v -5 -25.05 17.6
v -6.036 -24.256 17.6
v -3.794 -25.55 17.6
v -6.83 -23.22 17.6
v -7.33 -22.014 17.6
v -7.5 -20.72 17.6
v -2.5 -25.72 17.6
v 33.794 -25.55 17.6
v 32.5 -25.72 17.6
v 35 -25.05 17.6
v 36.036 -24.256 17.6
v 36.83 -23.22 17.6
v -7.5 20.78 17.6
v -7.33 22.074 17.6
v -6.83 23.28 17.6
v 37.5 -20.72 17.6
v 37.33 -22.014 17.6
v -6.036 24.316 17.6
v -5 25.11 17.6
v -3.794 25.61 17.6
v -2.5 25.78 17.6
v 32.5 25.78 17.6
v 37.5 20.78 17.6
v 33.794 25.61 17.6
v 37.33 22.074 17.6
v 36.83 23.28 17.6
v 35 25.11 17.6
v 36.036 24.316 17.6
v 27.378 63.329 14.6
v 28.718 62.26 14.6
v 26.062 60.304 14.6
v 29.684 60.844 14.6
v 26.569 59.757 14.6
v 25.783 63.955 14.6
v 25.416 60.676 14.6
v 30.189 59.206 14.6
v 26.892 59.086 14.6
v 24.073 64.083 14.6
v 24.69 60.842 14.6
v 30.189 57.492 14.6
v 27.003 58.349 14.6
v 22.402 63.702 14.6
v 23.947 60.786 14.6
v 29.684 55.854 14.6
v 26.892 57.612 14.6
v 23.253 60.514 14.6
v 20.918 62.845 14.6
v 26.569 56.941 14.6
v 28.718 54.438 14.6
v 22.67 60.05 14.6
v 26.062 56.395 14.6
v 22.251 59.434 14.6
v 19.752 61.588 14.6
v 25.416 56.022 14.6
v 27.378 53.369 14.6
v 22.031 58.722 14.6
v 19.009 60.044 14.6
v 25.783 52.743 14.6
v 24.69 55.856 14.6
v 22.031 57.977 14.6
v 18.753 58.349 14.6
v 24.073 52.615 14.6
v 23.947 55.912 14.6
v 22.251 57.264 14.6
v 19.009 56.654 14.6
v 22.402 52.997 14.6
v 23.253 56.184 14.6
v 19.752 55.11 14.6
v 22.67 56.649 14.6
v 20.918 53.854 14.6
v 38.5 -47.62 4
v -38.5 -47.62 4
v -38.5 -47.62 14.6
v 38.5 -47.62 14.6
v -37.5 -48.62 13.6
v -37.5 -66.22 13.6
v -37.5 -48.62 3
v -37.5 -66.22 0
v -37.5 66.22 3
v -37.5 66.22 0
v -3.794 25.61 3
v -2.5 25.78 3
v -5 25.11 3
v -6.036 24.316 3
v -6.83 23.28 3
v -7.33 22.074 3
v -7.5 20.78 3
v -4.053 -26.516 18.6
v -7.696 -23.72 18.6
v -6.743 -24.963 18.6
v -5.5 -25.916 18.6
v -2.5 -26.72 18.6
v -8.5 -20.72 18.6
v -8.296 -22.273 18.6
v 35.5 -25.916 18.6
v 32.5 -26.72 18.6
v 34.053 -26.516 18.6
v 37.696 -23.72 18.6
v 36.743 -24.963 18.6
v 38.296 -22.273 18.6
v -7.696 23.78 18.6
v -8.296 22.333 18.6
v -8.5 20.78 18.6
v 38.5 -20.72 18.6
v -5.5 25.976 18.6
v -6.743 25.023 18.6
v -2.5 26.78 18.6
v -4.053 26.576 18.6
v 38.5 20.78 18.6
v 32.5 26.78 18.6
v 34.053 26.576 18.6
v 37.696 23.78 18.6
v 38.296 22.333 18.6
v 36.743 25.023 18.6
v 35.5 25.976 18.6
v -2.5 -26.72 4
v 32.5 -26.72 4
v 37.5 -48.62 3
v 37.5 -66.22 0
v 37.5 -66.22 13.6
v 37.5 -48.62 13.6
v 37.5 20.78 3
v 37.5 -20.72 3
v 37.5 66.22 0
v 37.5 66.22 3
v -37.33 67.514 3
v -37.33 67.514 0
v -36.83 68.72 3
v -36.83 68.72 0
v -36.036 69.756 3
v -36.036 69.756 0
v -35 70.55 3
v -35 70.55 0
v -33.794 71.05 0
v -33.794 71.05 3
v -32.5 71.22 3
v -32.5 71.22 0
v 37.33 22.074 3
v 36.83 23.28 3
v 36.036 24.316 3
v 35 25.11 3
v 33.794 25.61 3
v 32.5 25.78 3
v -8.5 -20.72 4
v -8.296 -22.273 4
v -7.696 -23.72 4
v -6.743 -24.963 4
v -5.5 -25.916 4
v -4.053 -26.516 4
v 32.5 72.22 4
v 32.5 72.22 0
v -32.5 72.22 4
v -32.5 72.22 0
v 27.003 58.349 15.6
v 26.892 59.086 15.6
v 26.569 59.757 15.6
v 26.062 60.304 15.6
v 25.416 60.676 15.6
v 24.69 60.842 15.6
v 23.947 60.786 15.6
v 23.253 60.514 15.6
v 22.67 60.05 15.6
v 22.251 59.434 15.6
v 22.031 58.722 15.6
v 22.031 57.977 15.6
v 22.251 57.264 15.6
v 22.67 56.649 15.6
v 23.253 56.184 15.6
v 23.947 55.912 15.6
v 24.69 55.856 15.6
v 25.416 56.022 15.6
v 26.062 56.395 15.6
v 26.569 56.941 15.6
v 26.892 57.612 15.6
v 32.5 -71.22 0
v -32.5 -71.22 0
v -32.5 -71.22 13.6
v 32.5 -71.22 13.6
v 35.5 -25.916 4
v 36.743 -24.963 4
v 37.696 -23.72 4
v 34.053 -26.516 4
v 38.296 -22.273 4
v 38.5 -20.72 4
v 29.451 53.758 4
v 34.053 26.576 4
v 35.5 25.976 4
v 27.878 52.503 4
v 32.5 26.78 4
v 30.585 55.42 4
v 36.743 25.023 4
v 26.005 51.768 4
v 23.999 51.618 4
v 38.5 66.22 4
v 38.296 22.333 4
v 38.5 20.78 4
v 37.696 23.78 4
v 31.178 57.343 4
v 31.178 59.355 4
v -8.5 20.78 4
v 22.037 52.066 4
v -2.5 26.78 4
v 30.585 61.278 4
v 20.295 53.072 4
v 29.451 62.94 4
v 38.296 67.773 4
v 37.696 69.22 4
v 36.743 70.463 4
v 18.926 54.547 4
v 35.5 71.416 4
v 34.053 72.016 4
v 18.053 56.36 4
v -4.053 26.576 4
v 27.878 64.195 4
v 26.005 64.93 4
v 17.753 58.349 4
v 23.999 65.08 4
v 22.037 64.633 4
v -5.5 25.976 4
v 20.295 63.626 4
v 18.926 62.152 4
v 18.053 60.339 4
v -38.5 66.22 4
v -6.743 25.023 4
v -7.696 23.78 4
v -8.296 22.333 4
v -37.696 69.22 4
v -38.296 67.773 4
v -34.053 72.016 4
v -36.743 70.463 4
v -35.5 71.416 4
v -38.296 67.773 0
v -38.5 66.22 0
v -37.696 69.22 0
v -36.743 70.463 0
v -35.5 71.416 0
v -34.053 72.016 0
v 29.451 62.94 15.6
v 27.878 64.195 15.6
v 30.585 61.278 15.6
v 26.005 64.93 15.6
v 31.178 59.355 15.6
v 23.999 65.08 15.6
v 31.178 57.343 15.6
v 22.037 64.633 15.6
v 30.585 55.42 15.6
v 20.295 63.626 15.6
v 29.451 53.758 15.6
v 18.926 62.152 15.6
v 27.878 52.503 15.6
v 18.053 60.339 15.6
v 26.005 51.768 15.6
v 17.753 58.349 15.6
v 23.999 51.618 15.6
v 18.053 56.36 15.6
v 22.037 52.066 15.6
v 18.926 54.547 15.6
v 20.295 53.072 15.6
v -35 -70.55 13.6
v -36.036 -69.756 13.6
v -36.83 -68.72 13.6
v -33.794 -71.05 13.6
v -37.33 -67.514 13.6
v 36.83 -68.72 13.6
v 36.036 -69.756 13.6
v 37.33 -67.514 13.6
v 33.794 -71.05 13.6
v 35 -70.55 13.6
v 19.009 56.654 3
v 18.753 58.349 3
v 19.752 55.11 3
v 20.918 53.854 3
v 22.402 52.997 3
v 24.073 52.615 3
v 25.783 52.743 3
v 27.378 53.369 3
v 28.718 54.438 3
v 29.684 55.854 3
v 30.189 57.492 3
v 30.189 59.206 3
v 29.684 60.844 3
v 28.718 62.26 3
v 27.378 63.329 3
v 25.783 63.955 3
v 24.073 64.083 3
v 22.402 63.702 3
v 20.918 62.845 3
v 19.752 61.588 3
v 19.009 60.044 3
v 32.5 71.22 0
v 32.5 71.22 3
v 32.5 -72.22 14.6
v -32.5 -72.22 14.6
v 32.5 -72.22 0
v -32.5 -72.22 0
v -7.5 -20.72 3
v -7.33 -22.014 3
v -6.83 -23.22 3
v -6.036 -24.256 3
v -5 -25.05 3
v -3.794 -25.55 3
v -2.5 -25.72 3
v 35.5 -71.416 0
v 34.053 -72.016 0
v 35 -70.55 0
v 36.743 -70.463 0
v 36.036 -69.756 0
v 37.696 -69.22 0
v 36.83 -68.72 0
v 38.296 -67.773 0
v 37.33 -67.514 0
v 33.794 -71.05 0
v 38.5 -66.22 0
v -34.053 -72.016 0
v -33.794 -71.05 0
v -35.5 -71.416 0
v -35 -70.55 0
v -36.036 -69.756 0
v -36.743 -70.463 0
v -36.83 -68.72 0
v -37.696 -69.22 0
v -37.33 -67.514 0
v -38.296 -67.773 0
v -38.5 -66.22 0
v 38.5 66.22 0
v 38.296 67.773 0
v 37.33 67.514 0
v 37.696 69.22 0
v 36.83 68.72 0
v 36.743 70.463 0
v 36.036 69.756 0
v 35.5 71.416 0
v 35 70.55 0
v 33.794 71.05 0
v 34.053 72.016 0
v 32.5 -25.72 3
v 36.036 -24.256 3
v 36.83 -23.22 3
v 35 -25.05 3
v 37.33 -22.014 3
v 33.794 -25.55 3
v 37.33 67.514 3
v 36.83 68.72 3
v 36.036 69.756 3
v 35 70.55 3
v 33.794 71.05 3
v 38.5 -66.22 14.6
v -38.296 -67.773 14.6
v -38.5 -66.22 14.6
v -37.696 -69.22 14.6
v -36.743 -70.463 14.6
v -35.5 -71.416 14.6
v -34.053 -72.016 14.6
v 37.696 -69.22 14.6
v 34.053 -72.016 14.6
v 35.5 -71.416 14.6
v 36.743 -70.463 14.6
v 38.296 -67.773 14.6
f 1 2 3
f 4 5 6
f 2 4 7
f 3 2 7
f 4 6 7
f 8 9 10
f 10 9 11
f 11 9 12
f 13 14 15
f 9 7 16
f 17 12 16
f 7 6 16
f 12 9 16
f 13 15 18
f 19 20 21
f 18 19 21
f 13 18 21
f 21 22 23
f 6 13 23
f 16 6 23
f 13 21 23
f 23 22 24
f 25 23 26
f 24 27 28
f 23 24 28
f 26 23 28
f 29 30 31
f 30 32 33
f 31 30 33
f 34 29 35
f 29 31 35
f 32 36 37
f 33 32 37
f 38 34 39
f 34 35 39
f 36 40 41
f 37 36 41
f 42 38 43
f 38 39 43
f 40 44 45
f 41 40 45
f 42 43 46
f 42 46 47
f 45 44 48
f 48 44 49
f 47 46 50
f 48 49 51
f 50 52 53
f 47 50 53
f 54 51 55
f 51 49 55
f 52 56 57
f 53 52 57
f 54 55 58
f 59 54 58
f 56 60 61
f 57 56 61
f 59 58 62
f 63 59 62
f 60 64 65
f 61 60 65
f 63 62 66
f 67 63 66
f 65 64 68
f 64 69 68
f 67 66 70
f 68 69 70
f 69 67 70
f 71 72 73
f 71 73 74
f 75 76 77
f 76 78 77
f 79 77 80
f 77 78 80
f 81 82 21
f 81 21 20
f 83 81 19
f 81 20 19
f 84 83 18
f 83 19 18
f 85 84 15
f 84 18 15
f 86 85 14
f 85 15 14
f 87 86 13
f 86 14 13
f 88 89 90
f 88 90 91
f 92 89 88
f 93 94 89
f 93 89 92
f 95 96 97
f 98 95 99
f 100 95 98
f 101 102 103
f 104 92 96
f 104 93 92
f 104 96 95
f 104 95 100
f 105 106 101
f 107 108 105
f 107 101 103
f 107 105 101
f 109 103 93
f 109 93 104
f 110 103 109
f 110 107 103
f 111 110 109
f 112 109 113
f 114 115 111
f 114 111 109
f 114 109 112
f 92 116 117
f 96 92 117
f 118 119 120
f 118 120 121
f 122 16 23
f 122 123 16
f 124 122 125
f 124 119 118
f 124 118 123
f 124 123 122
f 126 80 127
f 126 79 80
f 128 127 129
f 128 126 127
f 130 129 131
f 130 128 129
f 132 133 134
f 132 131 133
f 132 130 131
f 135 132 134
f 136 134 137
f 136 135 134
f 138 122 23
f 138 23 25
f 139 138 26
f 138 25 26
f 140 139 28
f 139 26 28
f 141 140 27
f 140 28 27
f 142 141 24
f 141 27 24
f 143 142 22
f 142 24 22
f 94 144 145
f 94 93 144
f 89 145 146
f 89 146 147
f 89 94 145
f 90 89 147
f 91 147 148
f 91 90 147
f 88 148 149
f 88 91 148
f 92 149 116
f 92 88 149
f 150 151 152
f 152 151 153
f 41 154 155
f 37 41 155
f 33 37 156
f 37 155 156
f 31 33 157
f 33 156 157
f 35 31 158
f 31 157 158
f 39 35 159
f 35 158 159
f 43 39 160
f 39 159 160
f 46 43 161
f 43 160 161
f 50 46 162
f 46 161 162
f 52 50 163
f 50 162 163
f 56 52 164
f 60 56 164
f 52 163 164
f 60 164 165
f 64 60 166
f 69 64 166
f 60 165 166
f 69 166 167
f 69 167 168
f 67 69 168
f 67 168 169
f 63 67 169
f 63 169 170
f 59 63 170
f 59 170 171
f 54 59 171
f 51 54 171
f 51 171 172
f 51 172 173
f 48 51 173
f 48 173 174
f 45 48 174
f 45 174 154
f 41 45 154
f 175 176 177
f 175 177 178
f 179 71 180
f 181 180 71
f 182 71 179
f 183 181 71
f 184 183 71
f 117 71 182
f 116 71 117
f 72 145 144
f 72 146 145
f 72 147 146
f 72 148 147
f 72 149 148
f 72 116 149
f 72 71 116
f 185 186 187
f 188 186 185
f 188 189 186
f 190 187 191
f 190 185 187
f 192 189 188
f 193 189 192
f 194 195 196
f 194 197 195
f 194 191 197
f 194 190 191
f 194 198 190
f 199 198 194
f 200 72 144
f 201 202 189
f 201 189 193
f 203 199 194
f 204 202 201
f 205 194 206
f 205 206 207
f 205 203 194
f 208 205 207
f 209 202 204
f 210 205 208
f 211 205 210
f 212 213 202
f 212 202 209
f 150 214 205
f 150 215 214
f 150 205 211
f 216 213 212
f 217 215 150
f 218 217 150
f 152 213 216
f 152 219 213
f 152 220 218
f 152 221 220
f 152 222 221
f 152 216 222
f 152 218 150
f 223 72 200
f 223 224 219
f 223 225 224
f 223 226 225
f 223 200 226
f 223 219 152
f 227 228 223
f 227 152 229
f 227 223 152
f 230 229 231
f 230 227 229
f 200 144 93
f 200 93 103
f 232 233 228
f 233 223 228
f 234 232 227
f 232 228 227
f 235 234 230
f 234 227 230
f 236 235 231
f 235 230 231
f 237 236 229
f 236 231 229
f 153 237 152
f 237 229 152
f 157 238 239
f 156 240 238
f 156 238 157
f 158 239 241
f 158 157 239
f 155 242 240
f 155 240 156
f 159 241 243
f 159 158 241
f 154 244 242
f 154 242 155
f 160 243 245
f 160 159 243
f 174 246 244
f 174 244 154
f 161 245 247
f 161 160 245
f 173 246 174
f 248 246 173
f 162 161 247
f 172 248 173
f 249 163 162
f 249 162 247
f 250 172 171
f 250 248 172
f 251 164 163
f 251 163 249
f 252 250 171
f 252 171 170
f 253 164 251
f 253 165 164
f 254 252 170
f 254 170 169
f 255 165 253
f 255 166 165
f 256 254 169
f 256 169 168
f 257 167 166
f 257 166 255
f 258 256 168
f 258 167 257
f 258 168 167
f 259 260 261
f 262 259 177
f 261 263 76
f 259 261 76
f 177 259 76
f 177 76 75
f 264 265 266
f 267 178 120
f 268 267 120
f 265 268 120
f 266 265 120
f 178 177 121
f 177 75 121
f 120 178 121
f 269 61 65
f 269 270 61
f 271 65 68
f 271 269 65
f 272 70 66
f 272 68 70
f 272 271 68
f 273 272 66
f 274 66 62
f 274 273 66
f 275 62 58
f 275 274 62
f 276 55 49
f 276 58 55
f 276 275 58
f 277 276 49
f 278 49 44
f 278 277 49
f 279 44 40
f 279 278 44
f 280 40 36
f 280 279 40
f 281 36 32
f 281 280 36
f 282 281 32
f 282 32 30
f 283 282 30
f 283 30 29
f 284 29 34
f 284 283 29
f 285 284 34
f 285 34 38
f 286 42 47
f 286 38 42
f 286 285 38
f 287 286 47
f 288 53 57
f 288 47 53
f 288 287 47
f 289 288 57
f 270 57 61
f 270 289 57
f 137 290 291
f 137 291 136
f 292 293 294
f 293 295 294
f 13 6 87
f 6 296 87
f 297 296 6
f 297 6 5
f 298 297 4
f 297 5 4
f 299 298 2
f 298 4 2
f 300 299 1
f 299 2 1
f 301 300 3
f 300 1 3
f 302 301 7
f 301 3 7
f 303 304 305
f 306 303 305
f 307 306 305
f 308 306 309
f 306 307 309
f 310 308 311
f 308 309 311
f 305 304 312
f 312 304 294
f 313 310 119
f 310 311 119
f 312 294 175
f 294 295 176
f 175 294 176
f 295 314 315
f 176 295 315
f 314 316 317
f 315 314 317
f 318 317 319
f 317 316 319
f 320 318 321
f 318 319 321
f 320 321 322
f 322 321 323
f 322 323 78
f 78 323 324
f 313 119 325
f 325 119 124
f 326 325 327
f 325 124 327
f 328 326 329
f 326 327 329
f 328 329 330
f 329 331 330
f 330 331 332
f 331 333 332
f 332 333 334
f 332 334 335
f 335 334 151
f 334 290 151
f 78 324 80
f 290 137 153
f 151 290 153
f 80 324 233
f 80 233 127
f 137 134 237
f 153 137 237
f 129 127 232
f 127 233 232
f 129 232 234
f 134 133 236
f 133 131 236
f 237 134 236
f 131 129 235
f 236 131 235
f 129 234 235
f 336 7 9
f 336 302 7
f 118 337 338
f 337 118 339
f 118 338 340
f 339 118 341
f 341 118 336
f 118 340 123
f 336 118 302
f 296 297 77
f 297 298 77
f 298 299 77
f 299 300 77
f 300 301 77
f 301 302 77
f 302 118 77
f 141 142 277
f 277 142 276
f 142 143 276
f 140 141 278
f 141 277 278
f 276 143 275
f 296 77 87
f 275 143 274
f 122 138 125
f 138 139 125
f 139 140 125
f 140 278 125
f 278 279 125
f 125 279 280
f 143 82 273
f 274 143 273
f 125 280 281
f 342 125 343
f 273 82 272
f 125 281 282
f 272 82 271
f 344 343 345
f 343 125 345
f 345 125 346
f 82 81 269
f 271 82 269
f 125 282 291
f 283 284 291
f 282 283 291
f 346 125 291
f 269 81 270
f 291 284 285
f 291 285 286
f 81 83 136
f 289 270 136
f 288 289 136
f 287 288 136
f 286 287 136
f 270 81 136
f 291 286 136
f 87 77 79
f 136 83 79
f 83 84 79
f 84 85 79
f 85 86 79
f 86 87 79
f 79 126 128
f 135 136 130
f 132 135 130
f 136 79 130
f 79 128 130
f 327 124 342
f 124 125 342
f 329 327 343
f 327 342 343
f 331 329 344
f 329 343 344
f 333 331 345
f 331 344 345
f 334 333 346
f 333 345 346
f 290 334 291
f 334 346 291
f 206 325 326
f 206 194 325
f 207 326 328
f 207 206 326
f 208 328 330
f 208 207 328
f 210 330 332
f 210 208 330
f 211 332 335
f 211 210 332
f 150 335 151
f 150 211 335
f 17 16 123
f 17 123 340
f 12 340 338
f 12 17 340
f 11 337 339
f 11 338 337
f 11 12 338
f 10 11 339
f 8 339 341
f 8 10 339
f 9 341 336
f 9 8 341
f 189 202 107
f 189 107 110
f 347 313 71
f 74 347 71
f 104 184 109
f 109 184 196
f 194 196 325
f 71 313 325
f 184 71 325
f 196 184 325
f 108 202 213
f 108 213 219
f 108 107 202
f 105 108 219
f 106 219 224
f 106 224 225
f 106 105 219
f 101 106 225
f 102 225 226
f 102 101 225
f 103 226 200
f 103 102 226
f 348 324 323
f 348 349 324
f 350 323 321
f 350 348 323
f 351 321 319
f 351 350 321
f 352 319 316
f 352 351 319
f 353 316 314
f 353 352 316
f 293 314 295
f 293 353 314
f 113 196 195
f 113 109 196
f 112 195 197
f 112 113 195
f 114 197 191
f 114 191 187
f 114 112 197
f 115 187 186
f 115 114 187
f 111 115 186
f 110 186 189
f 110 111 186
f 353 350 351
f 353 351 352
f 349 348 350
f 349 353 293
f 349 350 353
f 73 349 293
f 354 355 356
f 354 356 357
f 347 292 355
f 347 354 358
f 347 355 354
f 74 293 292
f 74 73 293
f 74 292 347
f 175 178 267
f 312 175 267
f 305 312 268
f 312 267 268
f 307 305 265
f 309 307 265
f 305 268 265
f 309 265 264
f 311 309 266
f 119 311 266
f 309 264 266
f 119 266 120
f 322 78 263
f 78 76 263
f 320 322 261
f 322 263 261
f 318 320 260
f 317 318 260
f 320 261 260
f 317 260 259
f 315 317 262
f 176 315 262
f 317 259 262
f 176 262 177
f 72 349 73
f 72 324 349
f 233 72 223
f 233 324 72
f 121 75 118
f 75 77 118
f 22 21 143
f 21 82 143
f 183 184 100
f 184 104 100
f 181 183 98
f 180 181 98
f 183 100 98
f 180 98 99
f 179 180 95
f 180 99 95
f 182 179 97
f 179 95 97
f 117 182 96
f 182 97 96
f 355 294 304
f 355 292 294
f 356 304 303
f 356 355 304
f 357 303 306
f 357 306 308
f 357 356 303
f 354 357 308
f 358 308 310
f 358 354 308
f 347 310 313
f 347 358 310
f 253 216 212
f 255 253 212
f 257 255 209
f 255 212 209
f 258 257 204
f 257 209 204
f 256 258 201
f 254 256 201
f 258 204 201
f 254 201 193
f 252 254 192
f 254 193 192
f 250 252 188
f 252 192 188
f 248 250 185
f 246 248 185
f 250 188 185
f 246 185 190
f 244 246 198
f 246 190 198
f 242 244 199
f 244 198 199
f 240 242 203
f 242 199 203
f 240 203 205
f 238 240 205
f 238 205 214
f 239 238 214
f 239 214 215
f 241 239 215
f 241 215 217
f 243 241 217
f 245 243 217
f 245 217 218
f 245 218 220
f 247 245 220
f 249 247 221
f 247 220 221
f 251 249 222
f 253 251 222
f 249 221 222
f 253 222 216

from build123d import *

# Parameters (mm, degrees)
SKIZZE2_W                       = 144.44
SKIZZE2_H                       = 77
AUFSATZ_LINEAR_AUSTRAGEN1_DEPTH = 4
SKIZZE4_W                       = 77
SKIZZE4_H                       = 24.6
AUFSATZ_LINEAR_AUSTRAGEN2_DEPTH = 10.6
VERRUNDUNG2_R                   = 6
SKIZZE5_W                       = 47
SKIZZE5_H                       = 53.5
AUFSATZ_LINEAR_AUSTRAGEN3_DEPTH = 14.6
VERRUNDUNG4_R                   = 6
SKIZZE7_R                       = 6.75
AUFSATZ_LINEAR_AUSTRAGEN5_DEPTH = 11.6
WANDUNG2_T                      = -1
SKIZZE8_R                       = 2.5
SCHNITT_LINEAR_AUSTRAGEN1_DEPTH = 84.314694982


with BuildPart() as part:
    # Skizze2 → Aufsatz-Linear austragen1 (new body)
    with BuildSketch(Plane(origin=(0, 0, 0), x_dir=(0, 1, 0), z_dir=(0, 0, 1))):
        Rectangle(SKIZZE2_W, SKIZZE2_H)
    extrude(amount=AUFSATZ_LINEAR_AUSTRAGEN1_DEPTH)

    # Skizze4 → Aufsatz-Linear austragen2 (add)
    with BuildSketch(Plane.XY.offset(4)):
        with Locations((0, -59.92)):
            Rectangle(SKIZZE4_W, SKIZZE4_H)
    extrude(amount=AUFSATZ_LINEAR_AUSTRAGEN2_DEPTH)

    # Verrundung2
    verrundung2_edges = [part.edges().sort_by_distance(p)[0] for p in [
        (38.5, 72.22, 2),
        (38.5, -72.22, 7.3),
        (-38.5, -72.22, 7.3),
        (-38.5, 72.22, 2),
    ]]
    fillet(verrundung2_edges, radius=VERRUNDUNG2_R)

    # Skizze5 → Aufsatz-Linear austragen3 (add)
    with BuildSketch(Plane.XY.offset(4)):
        with Locations((15, 0.03)):
            Rectangle(SKIZZE5_W, SKIZZE5_H)
    extrude(amount=AUFSATZ_LINEAR_AUSTRAGEN3_DEPTH)

    # Verrundung4
    verrundung4_edges = [part.edges().sort_by_distance(p)[0] for p in [
        (38.5, -26.72, 11.3),
        (38.5, 26.78, 11.3),
        (-8.5, 26.78, 11.3),
        (-8.5, -26.72, 11.3),
    ]]
    fillet(verrundung4_edges, radius=VERRUNDUNG4_R)

    # Skizze7 → Aufsatz-Linear austragen5 (add)
    with BuildSketch(Plane.XY.offset(4)):
        with Locations(Location((24.503110224, 58.349132978, 0), (0, 0, 180))):
            Circle(SKIZZE7_R)
    extrude(amount=AUFSATZ_LINEAR_AUSTRAGEN5_DEPTH)

    # Wandung2
    wandung2_openings = [part.faces().sort_by_distance(p)[0] for p in [
        (0, 0, 0),
    ]]
    offset(amount=WANDUNG2_T, openings=wandung2_openings, kind=Kind.INTERSECTION)

    # Skizze8 → Schnitt-Linear austragen1 (cut, through all)
    with BuildSketch(Plane.XY.offset(15.6)):
        with Locations((24.503110224, 58.349132978)):
            Circle(SKIZZE8_R)
    extrude(amount=-SCHNITT_LINEAR_AUSTRAGEN1_DEPTH, mode=Mode.SUBTRACT)


solid = part.part
